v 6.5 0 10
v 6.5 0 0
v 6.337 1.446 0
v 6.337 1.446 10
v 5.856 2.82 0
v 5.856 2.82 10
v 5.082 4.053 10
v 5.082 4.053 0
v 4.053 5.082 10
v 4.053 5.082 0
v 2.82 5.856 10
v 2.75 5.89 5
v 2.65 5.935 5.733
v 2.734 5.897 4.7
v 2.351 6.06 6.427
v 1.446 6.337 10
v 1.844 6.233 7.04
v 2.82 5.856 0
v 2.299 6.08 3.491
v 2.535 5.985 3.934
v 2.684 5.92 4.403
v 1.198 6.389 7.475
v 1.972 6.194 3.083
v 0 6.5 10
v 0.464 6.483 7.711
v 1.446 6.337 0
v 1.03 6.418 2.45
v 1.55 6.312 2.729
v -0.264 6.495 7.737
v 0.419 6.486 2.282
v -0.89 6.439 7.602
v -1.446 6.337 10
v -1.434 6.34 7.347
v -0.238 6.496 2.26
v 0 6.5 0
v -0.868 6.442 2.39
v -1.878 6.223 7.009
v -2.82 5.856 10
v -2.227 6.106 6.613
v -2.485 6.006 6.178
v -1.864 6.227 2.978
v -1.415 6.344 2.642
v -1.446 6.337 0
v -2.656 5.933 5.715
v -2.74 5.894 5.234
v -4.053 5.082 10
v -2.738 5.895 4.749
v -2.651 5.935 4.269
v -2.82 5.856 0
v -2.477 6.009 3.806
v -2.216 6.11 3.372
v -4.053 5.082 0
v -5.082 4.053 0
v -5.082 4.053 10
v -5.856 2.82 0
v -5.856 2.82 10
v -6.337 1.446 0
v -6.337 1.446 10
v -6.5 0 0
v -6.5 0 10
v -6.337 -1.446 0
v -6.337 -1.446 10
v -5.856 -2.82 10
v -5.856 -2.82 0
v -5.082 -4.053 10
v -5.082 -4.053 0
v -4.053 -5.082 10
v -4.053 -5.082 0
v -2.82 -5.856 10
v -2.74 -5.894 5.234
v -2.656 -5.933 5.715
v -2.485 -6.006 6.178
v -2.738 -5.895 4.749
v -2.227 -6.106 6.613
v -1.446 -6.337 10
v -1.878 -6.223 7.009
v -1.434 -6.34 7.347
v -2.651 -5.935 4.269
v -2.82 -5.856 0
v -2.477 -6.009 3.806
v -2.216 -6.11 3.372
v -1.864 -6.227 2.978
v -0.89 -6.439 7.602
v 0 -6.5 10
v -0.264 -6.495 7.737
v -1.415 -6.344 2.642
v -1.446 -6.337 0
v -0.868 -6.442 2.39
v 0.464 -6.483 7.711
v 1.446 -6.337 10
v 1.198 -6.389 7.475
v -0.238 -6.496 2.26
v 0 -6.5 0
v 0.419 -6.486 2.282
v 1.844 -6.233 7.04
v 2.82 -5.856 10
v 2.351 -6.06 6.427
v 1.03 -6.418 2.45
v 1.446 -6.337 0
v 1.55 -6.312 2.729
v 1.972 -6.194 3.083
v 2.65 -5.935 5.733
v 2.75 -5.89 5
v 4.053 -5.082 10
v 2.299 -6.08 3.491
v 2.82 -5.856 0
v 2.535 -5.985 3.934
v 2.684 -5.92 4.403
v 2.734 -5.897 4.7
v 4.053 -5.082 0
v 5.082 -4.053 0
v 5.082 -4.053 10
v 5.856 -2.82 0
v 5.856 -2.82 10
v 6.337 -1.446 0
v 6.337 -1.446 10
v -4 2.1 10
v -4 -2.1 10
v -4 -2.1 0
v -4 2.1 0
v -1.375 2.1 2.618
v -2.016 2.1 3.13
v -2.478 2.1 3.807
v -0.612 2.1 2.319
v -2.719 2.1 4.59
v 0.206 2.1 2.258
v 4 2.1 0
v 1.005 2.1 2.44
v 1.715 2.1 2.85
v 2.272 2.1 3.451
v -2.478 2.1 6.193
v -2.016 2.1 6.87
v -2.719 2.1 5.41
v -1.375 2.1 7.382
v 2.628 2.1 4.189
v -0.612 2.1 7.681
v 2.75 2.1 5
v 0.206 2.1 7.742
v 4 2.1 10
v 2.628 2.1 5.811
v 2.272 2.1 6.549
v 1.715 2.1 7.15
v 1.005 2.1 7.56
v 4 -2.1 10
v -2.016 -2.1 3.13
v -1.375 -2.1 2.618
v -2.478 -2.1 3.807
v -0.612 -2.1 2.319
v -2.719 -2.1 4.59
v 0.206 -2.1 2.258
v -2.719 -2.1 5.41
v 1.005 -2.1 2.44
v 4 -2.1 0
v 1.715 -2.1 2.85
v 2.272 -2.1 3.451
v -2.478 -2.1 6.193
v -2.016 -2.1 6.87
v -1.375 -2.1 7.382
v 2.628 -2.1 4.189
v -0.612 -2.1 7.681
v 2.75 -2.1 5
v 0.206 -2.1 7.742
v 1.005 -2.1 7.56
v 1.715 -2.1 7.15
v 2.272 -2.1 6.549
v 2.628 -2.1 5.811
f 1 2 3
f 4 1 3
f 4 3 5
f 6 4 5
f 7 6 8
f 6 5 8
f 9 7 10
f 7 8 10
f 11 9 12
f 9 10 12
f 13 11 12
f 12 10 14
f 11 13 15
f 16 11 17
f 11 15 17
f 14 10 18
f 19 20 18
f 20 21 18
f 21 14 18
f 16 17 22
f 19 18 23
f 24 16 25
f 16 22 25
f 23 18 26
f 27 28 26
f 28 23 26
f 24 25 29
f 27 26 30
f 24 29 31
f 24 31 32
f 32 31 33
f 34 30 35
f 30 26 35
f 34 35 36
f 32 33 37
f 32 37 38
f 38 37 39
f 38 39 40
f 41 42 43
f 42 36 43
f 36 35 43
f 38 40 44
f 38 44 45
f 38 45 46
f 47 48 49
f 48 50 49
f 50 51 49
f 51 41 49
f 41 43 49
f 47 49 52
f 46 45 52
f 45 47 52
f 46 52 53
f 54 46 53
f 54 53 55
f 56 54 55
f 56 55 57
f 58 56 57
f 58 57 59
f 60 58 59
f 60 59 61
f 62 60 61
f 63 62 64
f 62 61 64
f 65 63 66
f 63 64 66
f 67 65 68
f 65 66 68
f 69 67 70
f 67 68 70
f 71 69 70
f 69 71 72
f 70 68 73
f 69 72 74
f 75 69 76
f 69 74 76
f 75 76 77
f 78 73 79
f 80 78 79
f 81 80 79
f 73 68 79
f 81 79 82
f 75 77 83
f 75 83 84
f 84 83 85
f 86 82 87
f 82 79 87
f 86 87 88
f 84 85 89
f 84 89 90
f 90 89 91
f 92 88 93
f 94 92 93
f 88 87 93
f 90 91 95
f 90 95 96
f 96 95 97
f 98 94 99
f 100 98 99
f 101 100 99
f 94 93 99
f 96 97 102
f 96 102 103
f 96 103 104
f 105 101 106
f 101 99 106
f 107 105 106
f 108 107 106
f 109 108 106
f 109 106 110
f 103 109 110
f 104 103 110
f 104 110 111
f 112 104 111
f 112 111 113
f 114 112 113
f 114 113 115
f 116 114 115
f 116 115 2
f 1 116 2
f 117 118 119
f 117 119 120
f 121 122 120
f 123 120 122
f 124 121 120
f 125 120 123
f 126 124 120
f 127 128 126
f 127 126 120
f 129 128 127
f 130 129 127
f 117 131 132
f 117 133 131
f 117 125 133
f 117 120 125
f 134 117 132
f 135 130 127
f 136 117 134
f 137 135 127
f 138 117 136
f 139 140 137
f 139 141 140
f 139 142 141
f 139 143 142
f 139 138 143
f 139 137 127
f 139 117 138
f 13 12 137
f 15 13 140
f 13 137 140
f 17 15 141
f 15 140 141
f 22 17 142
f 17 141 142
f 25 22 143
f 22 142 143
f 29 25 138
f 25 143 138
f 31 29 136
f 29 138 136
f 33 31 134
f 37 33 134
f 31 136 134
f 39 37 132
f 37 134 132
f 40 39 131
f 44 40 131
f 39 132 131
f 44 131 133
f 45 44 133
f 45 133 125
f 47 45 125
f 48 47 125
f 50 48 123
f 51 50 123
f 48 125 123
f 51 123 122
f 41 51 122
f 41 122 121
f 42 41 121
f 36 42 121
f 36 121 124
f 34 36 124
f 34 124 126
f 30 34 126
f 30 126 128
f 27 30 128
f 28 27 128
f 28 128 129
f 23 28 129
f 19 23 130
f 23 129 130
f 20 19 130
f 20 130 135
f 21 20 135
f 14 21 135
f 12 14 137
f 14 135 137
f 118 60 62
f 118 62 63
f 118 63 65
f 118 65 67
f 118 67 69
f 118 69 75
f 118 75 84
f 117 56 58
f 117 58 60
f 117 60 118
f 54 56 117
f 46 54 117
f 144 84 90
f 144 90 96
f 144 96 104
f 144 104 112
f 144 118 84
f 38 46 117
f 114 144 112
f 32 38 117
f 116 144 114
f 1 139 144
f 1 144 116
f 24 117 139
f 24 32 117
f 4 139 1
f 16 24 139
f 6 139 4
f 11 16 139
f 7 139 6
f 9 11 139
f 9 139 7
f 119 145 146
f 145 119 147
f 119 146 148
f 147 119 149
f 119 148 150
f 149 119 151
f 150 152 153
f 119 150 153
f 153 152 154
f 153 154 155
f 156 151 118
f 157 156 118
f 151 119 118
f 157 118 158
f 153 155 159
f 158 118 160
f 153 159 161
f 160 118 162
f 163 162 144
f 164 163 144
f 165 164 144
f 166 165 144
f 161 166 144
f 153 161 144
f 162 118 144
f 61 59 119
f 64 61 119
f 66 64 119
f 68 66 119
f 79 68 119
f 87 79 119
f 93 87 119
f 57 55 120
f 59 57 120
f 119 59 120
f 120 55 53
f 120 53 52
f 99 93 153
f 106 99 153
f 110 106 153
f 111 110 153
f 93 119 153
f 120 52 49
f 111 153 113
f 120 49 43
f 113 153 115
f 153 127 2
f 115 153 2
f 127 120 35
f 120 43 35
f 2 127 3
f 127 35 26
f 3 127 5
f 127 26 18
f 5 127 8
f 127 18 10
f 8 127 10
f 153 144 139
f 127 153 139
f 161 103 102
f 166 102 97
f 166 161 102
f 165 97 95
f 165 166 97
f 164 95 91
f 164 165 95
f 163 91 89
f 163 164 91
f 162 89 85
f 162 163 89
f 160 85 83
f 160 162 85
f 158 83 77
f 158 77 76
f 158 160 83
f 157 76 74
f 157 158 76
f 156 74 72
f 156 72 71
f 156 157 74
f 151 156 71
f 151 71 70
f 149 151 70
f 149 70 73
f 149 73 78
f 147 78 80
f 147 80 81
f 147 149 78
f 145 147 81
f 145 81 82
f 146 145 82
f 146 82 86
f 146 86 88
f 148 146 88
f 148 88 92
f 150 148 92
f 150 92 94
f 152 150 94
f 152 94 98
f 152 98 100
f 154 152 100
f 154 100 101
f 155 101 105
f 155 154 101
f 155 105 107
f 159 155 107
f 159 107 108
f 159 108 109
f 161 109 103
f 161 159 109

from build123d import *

# Parameters (mm, degrees)
SKETCH_R             = 6.5
PAD_DEPTH            = 10
SKETCH001_W          = 8
SKETCH001_H          = 4.2
POCKET_DEPTH         = 10.001
SKETCH002_R          = 2.75
POCKET001_DEPTH      = 6.501
POCKET001_DEPTH_BACK = -6.501


with BuildPart() as part:
    # Sketch → Pad (new body)
    with BuildSketch(Plane.XY):
        Circle(SKETCH_R)
    extrude(amount=PAD_DEPTH)

    # Sketch001 (on Face3 of Pad) → Pocket (cut, through all)
    with BuildSketch(Plane.XY.offset(10)):
        Rectangle(SKETCH001_W, SKETCH001_H)
    extrude(amount=-POCKET_DEPTH, mode=Mode.SUBTRACT)

    # Sketch002 → Pocket001 (cut, two sides)
    with BuildSketch(Plane.XZ) as pocket001_sk:
        with Locations((0, 5)):
            Circle(SKETCH002_R)
    extrude(amount=-POCKET001_DEPTH, mode=Mode.SUBTRACT)
    extrude(pocket001_sk.sketch, amount=-POCKET001_DEPTH_BACK, mode=Mode.SUBTRACT)


solid = part.part
